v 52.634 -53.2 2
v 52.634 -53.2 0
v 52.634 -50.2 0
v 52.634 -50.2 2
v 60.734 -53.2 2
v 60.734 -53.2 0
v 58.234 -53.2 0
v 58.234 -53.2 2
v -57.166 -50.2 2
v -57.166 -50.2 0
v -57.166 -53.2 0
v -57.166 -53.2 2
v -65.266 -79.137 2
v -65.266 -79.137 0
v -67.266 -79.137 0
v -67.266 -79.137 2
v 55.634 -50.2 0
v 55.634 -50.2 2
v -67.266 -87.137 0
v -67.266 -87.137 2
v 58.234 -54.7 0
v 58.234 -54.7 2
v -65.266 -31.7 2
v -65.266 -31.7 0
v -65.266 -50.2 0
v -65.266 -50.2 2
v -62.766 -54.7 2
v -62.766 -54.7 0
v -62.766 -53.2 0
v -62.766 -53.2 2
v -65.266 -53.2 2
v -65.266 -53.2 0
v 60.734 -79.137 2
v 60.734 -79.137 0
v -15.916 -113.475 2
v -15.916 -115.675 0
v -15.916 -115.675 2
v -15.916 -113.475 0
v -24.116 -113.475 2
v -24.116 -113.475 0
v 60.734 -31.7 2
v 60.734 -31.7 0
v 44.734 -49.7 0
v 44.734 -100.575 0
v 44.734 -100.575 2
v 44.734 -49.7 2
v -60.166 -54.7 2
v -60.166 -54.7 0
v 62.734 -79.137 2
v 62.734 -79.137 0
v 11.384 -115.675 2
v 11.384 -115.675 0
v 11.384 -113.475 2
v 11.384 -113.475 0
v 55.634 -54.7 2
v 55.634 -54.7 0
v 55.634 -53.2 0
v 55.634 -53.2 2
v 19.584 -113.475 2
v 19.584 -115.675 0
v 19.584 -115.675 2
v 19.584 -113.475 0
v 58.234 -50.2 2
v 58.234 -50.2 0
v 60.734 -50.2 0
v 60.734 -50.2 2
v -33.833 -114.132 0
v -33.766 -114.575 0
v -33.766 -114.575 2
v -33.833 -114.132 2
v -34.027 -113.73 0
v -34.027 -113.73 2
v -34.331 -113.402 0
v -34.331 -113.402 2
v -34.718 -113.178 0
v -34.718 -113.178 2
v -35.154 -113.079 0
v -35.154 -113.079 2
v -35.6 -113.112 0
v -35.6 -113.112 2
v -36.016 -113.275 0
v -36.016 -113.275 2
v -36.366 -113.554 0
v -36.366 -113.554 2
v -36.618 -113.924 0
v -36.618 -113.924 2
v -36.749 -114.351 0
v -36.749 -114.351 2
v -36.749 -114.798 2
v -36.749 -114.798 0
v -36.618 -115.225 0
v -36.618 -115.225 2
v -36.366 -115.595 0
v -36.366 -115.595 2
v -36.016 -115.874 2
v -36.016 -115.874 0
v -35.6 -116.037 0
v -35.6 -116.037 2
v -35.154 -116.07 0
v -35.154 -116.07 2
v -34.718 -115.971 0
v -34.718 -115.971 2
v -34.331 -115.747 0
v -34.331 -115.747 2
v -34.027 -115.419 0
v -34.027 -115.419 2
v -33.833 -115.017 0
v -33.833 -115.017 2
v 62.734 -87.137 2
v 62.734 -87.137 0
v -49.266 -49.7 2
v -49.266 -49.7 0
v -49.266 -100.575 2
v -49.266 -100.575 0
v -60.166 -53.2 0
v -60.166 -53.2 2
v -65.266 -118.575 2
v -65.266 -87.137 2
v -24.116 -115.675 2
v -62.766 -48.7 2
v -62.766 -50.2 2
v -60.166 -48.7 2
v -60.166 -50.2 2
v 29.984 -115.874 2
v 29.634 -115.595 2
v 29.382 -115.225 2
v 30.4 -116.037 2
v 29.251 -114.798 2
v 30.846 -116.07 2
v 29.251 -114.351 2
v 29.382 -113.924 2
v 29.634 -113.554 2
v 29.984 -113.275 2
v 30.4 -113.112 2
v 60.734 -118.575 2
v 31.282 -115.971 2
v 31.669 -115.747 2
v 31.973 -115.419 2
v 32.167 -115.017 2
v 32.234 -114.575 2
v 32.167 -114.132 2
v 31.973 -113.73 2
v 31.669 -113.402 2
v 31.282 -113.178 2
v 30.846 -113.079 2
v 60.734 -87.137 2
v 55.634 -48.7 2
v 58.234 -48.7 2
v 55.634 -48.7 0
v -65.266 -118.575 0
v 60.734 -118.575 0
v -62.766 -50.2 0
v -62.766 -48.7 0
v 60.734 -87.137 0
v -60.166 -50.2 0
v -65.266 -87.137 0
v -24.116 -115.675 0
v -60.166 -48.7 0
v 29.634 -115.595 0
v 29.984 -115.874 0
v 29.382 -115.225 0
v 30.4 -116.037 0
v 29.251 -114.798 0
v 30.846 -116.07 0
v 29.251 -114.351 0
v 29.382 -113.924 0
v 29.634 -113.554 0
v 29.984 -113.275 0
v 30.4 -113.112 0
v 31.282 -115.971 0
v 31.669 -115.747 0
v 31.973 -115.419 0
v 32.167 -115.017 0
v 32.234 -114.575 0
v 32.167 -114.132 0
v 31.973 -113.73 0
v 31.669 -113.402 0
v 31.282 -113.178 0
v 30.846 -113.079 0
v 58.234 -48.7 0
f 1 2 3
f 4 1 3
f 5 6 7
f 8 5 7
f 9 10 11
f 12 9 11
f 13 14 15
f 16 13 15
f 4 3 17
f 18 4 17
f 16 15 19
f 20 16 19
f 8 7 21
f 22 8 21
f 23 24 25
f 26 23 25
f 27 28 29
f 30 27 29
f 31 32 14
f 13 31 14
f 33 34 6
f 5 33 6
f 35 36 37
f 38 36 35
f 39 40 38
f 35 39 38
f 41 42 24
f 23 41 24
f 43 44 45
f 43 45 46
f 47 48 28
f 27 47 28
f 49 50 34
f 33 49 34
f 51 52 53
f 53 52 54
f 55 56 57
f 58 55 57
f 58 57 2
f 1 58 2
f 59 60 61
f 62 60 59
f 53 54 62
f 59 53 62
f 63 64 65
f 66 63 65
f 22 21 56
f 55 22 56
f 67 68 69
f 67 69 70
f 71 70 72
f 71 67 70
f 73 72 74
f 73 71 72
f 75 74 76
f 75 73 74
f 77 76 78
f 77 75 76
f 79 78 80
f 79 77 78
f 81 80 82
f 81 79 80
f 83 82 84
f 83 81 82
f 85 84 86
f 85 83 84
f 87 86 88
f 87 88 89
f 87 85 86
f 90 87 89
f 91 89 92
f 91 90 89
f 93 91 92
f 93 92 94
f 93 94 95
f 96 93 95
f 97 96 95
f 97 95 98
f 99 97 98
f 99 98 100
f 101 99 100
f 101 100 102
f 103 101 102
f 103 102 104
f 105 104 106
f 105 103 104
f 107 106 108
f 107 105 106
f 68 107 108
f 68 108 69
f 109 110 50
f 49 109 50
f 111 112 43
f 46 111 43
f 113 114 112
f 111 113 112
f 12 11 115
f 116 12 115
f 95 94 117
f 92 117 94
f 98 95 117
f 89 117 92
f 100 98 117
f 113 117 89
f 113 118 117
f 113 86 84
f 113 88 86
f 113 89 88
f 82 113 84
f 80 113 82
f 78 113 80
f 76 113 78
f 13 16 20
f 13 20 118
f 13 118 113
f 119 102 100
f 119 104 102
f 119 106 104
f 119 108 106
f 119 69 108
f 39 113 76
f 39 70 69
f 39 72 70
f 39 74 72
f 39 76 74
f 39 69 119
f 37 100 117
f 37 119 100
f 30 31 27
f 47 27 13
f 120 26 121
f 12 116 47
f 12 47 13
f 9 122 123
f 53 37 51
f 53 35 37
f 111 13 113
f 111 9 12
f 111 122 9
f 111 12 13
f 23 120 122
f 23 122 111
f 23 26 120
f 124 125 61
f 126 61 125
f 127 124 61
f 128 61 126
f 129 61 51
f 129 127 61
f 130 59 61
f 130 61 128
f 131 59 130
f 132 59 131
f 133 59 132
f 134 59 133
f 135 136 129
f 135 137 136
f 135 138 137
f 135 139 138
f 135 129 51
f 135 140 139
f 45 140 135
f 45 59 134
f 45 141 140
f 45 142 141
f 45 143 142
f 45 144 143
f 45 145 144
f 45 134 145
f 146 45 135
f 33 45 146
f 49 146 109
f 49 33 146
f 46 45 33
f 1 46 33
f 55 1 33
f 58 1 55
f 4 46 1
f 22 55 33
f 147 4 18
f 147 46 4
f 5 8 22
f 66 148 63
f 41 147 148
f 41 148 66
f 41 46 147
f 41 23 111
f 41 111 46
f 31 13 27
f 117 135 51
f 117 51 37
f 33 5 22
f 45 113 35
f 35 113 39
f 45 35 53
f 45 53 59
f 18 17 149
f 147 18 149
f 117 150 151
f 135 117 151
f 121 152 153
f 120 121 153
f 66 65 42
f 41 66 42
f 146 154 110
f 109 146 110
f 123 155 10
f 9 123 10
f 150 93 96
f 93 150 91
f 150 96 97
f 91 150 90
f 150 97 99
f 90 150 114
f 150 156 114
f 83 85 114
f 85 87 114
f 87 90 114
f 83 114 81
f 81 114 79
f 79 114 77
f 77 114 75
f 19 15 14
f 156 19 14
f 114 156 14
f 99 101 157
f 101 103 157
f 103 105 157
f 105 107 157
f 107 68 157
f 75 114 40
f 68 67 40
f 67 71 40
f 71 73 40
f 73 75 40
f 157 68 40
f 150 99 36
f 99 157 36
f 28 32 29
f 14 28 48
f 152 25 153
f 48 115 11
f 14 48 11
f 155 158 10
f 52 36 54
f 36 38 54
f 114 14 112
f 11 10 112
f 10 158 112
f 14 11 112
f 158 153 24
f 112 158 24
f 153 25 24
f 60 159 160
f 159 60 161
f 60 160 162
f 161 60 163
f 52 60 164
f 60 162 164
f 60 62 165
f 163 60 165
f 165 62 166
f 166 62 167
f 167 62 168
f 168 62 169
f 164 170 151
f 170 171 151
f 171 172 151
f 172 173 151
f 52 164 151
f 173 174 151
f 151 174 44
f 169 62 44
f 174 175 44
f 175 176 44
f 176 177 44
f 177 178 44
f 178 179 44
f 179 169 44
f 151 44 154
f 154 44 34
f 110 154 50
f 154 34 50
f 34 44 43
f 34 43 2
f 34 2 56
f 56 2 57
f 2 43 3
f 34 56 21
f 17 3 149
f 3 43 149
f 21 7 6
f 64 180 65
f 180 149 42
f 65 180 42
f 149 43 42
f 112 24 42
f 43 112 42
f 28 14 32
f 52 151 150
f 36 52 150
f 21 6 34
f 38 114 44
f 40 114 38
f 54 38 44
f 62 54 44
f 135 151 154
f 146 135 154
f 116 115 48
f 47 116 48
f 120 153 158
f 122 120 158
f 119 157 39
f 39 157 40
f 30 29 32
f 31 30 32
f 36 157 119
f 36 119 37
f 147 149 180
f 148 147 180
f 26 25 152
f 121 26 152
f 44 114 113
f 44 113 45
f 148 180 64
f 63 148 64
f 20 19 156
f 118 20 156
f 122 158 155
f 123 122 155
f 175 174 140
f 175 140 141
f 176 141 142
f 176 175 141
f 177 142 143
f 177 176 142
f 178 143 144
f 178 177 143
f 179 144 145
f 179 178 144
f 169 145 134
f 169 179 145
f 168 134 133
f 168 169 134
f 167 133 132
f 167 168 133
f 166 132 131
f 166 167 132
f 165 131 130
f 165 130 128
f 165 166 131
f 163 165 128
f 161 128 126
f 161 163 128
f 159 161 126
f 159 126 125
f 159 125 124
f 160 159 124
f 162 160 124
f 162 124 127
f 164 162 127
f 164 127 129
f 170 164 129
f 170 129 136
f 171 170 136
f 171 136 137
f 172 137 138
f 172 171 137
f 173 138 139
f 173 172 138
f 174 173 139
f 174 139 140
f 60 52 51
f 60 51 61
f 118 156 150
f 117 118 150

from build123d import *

# Parameters (mm, degrees)
SKETCH_1_R      = 1.5
SKETCH_1_W      = 8.2
SKETCH_1_H      = 2.2
SKETCH_1_W_2    = 94
SKETCH_1_H_2    = 50.875
EXTRUDE_1_DEPTH = 2


with BuildPart() as part:
    # 草图1 → 凸台-拉伸1 (new body)
    with BuildSketch(Plane.XY):
        Polygon((-62.766155614, -54.699512395), (-62.766155614, -53.199512395), (-65.266155614, -53.199512395), (-65.266155614, -79.137012395), (-67.266155614, -79.137012395), (-67.266155614, -87.137012395), (-65.266155614, -87.137012395), (-65.266155614, -118.574512395), (60.733844386, -118.574512395), (60.733844386, -87.137012395), (62.733844386, -87.137012395), (62.733844386, -79.137012395), (60.733844386, -79.137012395), (60.733844386, -53.199512395), (58.233844386, -53.199512395), (58.233844386, -54.699512395), (55.633844386, -54.699512395), (55.633844386, -53.199512395), (52.633844386, -53.199512395), (52.633844386, -50.199512395), (55.633844386, -50.199512395), (55.633844386, -48.699512395), (58.233844386, -48.699512395), (58.233844386, -50.199512395), (60.733844386, -50.199512395), (60.733844386, -31.699512395), (-65.266155614, -31.699512395), (-65.266155614, -50.199512395), (-62.766155614, -50.199512395), (-62.766155614, -48.699512395), (-60.166155614, -48.699512395), (-60.166155614, -50.199512395), (-57.166155614, -50.199512395), (-57.166155614, -53.199512395), (-60.166155614, -53.199512395), (-60.166155614, -54.699512395), align=None)
        with Locations((-35.266155614, -114.574512396)):
            Circle(SKETCH_1_R, mode=Mode.SUBTRACT)
        with Locations((-20.016155614, -114.574512396)):
            Rectangle(SKETCH_1_W, SKETCH_1_H, mode=Mode.SUBTRACT)
        with Locations((15.483844386, -114.574512396)):
            Rectangle(SKETCH_1_W, SKETCH_1_H, mode=Mode.SUBTRACT)
        with Locations((30.733844386, -114.574512396)):
            Circle(SKETCH_1_R, mode=Mode.SUBTRACT)
        with Locations((-2.266155614, -75.137012395)):
            Rectangle(SKETCH_1_W_2, SKETCH_1_H_2, mode=Mode.SUBTRACT)
    extrude(amount=EXTRUDE_1_DEPTH)


solid = part.part
